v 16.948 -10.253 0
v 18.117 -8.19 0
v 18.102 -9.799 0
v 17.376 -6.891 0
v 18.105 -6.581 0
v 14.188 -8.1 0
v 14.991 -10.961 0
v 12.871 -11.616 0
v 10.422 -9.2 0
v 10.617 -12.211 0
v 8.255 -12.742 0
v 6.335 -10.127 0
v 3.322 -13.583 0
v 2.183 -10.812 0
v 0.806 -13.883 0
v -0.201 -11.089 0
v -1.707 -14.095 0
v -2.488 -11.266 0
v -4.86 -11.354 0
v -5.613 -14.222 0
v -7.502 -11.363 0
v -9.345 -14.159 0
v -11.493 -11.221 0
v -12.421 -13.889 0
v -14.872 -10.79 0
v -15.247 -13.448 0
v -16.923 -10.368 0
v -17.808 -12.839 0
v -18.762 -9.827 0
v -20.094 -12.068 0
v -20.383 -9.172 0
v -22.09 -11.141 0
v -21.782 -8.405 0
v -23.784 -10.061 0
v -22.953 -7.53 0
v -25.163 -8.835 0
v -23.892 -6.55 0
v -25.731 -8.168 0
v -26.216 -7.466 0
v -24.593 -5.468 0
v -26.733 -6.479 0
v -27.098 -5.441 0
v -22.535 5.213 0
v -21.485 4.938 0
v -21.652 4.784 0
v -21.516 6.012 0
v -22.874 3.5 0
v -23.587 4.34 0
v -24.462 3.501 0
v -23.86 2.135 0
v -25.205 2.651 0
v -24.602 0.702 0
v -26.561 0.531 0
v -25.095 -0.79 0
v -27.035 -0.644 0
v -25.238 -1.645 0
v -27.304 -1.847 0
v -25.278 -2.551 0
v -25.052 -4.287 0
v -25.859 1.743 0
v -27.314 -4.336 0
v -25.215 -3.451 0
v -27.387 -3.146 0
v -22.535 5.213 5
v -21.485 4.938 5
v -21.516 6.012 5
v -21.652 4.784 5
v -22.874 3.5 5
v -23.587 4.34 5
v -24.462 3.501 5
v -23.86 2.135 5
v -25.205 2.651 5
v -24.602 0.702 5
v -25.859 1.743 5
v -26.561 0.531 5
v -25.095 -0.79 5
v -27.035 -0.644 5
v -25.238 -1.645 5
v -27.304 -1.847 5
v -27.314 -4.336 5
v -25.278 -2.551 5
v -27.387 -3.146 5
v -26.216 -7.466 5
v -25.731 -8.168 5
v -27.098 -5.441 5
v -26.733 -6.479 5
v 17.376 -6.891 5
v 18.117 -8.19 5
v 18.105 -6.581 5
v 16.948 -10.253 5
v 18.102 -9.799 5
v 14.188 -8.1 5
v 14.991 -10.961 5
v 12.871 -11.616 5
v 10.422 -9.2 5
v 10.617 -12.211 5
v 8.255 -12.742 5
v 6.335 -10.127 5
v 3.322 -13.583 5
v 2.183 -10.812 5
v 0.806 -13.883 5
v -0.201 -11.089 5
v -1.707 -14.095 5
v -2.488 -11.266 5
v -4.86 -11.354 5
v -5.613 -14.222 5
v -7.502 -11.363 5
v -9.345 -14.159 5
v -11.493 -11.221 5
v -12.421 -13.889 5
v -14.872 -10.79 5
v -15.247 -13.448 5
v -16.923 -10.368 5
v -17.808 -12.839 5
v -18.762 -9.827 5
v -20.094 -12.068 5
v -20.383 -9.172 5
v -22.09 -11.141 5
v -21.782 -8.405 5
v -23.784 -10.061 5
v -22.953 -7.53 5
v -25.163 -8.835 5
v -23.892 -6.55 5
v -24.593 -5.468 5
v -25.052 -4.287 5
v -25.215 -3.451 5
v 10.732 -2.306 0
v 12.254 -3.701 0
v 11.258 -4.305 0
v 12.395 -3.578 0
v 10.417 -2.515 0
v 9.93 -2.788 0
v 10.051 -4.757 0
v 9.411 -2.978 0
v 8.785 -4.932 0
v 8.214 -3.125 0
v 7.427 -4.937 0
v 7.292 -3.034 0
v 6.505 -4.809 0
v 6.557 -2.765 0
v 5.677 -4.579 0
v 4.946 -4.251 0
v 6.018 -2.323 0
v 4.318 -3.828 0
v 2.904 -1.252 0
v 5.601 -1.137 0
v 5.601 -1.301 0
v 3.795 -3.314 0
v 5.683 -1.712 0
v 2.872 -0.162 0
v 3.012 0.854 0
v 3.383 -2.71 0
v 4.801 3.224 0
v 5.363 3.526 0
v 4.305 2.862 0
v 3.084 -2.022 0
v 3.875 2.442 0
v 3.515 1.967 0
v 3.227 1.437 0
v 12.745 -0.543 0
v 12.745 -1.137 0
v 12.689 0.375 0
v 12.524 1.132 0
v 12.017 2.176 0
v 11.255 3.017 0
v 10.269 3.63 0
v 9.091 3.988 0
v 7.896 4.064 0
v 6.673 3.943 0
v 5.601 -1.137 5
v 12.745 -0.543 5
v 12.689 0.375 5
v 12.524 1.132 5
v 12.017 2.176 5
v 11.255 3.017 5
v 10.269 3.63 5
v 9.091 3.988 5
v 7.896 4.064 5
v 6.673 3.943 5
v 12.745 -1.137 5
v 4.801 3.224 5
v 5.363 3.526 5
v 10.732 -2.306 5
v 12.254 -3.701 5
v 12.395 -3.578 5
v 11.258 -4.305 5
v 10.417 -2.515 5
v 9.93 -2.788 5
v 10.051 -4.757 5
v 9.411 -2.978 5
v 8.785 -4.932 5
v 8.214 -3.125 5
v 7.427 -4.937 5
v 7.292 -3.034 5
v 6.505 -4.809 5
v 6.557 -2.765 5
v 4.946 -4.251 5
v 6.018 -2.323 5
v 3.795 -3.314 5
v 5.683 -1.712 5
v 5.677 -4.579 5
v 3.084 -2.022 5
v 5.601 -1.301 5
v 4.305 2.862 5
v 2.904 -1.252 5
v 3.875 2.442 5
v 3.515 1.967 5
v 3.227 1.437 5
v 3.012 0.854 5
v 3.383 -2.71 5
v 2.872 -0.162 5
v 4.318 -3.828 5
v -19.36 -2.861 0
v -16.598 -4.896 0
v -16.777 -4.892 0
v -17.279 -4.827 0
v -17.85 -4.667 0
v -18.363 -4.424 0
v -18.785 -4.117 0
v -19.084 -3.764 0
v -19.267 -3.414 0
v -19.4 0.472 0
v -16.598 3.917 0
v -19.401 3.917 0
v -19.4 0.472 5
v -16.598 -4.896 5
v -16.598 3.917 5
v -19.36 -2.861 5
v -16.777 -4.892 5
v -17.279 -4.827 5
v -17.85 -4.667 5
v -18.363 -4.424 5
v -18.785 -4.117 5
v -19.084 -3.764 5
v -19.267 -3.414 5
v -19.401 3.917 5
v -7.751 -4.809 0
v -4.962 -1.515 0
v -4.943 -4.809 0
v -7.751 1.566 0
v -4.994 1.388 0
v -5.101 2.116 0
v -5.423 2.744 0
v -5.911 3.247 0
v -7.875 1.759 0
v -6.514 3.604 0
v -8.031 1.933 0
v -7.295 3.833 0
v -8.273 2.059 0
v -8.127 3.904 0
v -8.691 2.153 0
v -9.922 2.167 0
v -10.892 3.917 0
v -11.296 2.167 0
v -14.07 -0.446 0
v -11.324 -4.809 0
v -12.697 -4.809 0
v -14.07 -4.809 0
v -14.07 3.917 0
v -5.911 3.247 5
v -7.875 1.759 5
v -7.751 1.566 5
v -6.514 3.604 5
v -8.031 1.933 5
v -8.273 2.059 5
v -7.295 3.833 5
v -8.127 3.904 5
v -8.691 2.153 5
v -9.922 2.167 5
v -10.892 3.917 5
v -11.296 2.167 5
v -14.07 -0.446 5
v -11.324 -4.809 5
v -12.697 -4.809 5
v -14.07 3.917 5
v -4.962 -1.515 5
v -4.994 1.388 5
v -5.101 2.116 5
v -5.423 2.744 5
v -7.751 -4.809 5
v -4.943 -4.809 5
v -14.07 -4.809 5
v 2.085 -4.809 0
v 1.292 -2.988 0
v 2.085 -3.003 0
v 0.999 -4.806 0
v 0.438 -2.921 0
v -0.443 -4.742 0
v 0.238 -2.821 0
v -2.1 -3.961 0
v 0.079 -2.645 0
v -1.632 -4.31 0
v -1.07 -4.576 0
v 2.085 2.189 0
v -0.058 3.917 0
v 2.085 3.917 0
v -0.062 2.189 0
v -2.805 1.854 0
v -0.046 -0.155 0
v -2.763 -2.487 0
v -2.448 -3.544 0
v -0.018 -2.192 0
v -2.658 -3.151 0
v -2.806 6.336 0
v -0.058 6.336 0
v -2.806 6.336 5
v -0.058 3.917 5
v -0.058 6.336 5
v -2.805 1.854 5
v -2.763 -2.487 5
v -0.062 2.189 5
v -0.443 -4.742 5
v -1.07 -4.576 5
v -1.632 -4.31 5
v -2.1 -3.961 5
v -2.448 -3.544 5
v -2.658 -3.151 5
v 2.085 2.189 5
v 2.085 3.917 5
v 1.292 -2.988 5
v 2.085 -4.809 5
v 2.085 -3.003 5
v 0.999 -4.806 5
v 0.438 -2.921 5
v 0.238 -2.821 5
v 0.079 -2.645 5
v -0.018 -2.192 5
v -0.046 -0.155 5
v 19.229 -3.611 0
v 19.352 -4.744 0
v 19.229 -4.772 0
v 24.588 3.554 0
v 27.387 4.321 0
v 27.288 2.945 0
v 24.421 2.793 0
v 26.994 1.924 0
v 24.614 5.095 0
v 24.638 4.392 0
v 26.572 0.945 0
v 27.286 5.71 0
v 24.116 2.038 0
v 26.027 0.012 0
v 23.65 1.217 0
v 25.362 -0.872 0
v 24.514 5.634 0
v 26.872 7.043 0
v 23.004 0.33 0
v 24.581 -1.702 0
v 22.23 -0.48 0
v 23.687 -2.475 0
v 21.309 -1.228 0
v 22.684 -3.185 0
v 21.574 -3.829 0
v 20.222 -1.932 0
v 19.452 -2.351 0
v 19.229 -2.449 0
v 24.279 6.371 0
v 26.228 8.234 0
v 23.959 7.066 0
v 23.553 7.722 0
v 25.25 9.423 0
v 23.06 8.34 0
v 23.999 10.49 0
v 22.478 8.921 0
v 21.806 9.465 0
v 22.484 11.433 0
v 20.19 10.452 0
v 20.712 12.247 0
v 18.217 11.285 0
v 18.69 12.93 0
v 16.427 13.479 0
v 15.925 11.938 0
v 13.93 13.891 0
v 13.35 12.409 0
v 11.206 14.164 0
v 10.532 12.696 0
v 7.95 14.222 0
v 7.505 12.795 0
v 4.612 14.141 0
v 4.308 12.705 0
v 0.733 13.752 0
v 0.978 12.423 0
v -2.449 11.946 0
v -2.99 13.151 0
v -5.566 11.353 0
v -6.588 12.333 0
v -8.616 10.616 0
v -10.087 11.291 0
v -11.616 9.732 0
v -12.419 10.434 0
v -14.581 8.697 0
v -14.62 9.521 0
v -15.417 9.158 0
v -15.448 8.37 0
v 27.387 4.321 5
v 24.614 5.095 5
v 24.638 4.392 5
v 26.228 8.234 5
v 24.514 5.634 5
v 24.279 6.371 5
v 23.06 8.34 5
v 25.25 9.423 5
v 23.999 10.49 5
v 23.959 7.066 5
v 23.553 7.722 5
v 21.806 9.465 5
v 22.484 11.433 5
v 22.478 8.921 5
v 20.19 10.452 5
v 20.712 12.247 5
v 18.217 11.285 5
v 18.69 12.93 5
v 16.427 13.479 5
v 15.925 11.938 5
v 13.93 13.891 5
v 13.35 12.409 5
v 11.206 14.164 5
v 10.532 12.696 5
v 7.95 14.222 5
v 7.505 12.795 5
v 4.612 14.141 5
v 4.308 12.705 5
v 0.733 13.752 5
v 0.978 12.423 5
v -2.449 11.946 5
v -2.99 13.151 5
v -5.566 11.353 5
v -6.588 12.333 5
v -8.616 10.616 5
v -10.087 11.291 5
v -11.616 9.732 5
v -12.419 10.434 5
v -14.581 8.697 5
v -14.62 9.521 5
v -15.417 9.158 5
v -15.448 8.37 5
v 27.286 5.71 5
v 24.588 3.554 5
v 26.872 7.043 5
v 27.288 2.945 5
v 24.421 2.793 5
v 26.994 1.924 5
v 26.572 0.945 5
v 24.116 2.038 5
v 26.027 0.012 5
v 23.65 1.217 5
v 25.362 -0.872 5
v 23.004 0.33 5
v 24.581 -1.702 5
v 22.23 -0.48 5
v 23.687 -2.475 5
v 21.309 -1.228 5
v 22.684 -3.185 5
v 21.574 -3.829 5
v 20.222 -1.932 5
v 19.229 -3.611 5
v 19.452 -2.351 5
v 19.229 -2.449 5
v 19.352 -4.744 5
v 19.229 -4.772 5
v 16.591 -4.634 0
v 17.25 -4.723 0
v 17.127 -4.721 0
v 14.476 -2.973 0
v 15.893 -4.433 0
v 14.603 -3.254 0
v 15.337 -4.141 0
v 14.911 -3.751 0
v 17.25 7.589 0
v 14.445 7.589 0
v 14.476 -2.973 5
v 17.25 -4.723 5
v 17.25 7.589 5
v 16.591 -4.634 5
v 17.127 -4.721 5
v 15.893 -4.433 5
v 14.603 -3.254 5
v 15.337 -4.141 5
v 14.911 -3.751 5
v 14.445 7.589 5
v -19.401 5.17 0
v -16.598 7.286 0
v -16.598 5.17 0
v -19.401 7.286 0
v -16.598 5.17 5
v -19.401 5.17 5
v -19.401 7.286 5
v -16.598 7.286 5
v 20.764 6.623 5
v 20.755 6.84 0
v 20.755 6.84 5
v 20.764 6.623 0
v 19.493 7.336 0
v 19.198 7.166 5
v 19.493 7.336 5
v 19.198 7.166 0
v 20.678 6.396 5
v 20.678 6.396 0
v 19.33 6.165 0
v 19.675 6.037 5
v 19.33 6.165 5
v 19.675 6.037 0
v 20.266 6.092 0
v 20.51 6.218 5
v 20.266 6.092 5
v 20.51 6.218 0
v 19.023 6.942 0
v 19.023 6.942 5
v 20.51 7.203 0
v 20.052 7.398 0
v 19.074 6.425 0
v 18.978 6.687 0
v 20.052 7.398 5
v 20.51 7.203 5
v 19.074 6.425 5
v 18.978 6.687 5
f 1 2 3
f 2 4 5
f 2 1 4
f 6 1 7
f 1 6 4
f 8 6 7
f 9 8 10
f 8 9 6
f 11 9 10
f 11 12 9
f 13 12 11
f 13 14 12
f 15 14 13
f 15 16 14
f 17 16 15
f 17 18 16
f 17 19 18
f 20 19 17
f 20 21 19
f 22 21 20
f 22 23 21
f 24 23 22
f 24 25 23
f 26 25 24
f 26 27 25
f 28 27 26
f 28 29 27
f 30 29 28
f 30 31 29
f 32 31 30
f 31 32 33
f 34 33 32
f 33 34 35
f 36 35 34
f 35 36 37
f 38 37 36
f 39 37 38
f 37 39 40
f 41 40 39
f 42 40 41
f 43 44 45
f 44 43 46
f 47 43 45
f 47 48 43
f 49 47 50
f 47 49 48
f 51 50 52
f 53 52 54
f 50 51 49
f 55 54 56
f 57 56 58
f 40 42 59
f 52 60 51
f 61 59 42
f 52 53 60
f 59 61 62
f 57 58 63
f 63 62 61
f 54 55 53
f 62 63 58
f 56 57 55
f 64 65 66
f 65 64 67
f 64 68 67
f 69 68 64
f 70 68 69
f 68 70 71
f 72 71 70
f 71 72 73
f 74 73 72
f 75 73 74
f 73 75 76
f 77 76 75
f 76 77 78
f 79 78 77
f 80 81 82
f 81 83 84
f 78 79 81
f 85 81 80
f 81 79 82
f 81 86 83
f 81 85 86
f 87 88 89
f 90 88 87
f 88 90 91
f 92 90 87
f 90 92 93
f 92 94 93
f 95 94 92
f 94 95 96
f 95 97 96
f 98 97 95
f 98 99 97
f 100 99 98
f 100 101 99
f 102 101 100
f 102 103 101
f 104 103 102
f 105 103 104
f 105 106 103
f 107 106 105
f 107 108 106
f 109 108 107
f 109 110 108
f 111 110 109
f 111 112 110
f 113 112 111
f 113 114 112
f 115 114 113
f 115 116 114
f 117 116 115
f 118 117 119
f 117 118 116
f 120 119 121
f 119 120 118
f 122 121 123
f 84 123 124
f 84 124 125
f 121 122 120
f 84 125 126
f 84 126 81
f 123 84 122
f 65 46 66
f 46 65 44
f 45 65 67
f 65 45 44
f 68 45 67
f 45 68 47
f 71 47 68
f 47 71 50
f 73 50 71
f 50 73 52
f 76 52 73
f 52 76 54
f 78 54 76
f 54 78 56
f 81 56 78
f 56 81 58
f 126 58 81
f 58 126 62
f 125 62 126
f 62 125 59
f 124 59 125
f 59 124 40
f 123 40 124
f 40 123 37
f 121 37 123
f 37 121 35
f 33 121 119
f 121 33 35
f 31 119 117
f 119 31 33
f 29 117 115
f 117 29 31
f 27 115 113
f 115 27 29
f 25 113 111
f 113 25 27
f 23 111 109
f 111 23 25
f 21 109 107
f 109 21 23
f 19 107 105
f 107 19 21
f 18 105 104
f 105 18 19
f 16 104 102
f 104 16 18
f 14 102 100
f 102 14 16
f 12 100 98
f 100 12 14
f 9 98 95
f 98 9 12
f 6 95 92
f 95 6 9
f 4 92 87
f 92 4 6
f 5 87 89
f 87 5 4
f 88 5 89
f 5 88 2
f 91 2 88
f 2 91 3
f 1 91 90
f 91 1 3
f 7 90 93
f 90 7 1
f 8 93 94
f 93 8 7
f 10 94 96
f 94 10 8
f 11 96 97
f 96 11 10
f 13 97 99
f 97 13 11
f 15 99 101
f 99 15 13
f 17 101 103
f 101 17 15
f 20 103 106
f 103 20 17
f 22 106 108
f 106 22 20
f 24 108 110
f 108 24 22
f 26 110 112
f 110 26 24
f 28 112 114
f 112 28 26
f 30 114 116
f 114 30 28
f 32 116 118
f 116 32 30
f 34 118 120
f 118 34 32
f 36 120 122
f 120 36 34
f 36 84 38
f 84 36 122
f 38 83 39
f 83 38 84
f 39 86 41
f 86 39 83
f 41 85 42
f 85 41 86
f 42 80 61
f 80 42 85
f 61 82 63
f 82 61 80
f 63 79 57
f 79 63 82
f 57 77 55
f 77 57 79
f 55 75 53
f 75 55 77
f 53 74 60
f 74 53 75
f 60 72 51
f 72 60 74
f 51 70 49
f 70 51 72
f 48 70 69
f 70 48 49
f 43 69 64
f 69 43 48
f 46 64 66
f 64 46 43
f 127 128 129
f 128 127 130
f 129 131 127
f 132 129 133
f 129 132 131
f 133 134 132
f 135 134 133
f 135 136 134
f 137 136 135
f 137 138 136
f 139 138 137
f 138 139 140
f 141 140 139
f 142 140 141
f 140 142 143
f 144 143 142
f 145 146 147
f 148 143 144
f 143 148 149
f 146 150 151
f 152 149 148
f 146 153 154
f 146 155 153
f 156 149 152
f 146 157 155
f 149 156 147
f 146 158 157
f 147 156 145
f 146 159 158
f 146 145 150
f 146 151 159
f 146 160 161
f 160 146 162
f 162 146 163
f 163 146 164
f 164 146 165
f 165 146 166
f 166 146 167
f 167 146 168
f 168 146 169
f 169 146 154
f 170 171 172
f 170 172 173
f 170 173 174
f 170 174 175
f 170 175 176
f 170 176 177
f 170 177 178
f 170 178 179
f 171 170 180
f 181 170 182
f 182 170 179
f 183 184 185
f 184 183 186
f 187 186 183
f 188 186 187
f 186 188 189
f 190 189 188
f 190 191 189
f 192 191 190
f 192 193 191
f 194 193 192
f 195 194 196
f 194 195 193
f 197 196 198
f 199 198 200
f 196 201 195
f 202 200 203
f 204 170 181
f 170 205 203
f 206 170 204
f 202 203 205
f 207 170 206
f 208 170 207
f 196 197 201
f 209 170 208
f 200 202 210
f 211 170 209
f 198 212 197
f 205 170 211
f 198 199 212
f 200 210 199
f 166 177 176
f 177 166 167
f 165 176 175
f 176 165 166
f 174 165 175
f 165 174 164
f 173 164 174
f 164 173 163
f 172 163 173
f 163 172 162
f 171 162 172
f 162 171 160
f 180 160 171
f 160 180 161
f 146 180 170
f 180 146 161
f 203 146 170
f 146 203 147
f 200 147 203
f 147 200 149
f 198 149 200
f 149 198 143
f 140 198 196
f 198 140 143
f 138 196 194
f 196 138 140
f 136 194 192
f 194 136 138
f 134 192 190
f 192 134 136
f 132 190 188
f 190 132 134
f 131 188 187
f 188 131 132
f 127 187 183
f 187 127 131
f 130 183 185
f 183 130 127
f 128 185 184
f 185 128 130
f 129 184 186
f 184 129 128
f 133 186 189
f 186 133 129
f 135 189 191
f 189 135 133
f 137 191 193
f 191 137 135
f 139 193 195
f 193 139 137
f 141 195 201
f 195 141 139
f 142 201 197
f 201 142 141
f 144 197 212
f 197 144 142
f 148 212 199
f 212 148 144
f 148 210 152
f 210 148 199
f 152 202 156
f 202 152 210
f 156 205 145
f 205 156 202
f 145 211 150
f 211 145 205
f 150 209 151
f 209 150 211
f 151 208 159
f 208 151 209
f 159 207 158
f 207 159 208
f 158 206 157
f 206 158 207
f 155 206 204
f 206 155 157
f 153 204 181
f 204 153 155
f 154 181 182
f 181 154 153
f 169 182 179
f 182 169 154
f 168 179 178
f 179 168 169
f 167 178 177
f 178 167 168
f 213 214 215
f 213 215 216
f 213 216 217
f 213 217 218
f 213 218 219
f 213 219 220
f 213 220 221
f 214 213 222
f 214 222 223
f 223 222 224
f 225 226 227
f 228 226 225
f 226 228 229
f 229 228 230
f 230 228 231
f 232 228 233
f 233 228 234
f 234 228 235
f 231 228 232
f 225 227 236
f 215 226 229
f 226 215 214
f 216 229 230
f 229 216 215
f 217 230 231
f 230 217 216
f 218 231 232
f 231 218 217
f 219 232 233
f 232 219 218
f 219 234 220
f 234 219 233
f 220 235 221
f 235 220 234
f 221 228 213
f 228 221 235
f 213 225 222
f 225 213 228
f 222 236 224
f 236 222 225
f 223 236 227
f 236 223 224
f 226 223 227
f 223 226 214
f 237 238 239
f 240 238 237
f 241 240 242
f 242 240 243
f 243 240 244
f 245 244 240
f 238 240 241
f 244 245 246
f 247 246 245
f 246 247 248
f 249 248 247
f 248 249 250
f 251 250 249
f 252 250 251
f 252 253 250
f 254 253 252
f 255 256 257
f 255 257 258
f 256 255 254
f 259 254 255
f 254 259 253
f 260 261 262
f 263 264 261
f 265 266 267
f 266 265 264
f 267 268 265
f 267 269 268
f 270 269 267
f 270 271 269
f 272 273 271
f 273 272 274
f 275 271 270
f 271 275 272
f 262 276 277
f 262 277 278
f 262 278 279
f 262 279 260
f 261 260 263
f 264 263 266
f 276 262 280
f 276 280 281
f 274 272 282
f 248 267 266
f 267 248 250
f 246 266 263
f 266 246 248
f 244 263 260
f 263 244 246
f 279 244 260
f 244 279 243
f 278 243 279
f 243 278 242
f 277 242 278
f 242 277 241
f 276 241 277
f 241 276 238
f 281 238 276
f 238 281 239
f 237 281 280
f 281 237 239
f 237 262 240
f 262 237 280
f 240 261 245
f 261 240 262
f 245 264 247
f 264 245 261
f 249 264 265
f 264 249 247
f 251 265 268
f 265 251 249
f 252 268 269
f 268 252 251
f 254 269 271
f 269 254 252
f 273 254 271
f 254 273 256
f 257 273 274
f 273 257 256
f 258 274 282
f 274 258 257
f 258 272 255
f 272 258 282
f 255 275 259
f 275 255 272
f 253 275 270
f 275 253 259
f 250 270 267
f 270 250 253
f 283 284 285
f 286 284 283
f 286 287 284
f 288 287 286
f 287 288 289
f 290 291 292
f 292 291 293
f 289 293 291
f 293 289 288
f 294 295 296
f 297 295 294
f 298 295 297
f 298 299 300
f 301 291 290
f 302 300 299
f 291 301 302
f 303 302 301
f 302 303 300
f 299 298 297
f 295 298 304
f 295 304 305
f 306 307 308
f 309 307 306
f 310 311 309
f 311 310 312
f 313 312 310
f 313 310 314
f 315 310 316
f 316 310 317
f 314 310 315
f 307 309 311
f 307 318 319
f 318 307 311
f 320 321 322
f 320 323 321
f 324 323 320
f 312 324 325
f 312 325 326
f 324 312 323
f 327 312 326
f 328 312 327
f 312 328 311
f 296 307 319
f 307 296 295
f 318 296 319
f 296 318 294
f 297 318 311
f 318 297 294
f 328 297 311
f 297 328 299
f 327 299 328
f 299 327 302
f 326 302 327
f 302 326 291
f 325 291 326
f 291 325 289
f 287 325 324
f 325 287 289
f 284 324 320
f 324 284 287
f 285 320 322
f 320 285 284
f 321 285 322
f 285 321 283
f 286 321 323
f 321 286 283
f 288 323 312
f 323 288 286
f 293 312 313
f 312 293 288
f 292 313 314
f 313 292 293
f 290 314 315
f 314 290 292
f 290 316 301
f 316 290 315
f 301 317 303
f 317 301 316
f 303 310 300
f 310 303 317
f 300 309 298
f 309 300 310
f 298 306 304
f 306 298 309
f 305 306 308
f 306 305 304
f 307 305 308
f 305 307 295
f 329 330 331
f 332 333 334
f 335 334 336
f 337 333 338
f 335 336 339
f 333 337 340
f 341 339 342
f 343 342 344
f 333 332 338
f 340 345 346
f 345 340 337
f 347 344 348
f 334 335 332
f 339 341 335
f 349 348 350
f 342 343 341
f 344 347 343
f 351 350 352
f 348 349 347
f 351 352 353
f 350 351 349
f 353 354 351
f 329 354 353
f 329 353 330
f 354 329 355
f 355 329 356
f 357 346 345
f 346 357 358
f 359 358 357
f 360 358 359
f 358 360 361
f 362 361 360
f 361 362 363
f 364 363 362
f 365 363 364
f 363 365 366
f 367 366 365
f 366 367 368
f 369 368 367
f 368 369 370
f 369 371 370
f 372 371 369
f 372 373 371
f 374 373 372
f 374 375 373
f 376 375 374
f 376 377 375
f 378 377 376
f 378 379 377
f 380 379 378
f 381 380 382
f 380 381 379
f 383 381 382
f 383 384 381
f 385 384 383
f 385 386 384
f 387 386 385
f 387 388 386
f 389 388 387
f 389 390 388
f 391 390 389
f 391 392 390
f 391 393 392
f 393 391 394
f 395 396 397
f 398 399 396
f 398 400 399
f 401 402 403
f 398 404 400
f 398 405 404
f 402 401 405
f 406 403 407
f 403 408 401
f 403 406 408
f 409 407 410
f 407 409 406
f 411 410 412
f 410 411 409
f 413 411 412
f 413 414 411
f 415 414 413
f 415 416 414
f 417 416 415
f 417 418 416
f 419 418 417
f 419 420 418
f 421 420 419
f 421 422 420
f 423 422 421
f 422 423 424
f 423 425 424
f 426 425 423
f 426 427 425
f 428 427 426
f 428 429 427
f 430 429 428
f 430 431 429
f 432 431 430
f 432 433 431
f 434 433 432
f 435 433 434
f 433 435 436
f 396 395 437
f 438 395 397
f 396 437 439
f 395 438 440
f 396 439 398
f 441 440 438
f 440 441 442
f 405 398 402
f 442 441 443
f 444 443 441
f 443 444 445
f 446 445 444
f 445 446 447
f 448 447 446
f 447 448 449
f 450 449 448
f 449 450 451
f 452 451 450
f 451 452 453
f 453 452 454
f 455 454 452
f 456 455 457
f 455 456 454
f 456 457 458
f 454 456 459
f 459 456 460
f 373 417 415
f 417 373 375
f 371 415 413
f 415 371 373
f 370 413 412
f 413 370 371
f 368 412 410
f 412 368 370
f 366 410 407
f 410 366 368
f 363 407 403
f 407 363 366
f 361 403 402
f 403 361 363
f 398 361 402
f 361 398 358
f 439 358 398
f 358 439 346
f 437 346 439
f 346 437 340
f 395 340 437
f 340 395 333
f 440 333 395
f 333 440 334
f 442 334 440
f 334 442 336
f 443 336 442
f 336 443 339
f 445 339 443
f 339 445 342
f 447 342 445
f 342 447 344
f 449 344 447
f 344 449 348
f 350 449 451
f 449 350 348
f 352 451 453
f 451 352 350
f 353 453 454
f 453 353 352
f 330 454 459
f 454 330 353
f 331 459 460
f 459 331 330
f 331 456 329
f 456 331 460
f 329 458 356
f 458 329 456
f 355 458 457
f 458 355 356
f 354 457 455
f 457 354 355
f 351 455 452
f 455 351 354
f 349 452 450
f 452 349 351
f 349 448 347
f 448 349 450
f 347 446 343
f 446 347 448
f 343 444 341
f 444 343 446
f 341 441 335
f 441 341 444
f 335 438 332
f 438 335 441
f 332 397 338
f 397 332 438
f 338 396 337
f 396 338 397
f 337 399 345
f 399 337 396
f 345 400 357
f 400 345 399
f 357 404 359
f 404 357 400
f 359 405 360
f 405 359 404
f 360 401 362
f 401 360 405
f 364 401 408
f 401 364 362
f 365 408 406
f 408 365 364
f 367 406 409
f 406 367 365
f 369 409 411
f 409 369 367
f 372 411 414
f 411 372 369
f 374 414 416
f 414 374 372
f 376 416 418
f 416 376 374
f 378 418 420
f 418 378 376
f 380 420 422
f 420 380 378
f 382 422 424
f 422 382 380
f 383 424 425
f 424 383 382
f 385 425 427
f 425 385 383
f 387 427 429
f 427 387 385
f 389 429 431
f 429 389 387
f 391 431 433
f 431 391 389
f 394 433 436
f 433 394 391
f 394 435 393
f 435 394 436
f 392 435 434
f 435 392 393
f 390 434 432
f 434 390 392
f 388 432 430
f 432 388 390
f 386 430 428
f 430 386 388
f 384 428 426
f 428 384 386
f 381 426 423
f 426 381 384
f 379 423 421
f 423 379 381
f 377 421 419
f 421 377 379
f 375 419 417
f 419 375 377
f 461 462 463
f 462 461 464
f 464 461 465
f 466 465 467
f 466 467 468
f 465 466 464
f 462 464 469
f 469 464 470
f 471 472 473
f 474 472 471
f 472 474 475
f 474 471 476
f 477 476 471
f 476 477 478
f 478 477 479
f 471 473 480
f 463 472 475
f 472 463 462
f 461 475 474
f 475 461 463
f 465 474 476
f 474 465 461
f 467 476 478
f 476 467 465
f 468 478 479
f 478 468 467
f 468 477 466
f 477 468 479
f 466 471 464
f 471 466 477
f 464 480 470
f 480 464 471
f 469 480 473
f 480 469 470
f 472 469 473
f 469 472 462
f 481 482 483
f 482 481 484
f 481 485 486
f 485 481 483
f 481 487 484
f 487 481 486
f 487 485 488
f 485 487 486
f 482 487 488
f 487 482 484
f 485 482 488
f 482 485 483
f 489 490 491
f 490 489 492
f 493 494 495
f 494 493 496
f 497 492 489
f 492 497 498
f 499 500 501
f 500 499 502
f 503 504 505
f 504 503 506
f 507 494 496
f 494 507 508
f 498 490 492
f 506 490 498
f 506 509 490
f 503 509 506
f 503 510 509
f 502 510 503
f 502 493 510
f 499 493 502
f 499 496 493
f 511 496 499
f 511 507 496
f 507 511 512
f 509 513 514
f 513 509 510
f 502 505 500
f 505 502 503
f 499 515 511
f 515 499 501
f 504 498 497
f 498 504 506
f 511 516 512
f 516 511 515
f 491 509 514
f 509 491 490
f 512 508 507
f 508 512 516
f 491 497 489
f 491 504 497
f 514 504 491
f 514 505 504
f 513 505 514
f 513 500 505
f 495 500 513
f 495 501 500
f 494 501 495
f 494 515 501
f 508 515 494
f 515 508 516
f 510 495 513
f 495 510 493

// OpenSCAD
module path_path3352(h)
{
  scale([25.4/90, -25.4/90, 1])
    linear_extrude(height=h)
      polygon(points=[[-33.111633,50.168154],[-44.012584,49.213578],[-54.023851,47.649181],[-63.100482,45.492795],[-71.197524,42.762250],[-78.270026,39.475378],[-84.273035,35.650010],[-89.161598,31.303979],[-91.173915,28.941286],[-92.890763,26.455114],[-94.723907,22.957046],[-96.015966,19.279001],[-96.782855,15.362265],[-97.040493,11.148124],[-96.745693,6.545797],[-95.794033,2.280564],[-94.112301,-1.881905],[-91.627283,-6.175936],[-89.309517,-9.392914],[-86.677459,-12.406425],[-83.575963,-15.378429],[-79.849883,-18.470886],[-76.237963,-21.302676],[-76.183063,-19.400586],[-76.128163,-17.498496],[-76.718383,-16.951476],[-81.050087,-12.400645],[-84.543446,-7.565842],[-87.174068,-2.486557],[-88.917563,2.797724],[-89.424240,5.827239],[-89.566139,9.039295],[-89.345776,12.228741],[-88.765663,15.190424],[-87.140493,19.374438],[-84.655876,23.208724],[-81.329610,26.681912],[-77.179492,29.782633],[-72.223318,32.499515],[-66.478886,34.821191],[-59.963992,36.736291],[-52.696433,38.233444],[-40.723683,39.760806],[-26.581603,40.262034],[-17.221748,40.230718],[-8.814548,39.919613],[-0.711781,39.291855],[7.734777,38.310584],[22.445442,35.881930],[36.928359,32.599864],[50.273066,28.699385],[61.569097,24.415494],[64.151257,23.317184],[64.192557,29.019034],[64.141557,34.720884],[60.052227,36.328114],[53.116932,38.839293],[45.606097,41.159691],[37.617882,43.269090],[29.250449,45.147270],[11.770571,48.129101],[2.854447,49.192314],[-6.048253,49.943434],[-19.889896,50.391321],[-33.111723,50.168154],[-33.111633,50.168154]]);
  scale([25.4/90, -25.4/90, 1])
    linear_extrude(height=h)
      polygon(points=[[26.315127,17.493594],[23.048386,17.040187],[20.113770,16.226454],[17.525721,15.064159],[15.298676,13.565068],[13.447074,11.740944],[11.985356,9.603554],[10.927961,7.164662],[10.289327,4.436034],[10.177769,0.572899],[10.672737,-3.027166],[11.433263,-5.090272],[12.455310,-6.967962],[13.731097,-8.653671],[15.252842,-10.140832],[17.012764,-11.422881],[19.003083,-12.493250],[23.643787,-13.972686],[27.978032,-14.399835],[32.210637,-14.130826],[36.387895,-12.861282],[39.880651,-10.691090],[42.580182,-7.710686],[44.377767,-4.010506],[44.962352,-1.328646],[45.157717,1.925674],[45.158267,4.030384],[32.502687,4.030384],[19.847107,4.030384],[19.847107,4.610504],[20.137537,6.067234],[21.323694,8.231358],[23.233823,9.798030],[25.837719,10.750394],[29.105177,11.071594],[33.345884,10.552341],[35.184033,9.879966],[36.908907,8.911704],[38.025697,8.169334],[40.972197,10.424074],[43.918707,12.678824],[43.418957,13.114034],[39.891932,15.253343],[35.613677,16.854714],[31.127066,17.475343],[26.315127,17.493594],[26.315127,17.493594]]);
  scale([25.4/90, -25.4/90, 1])
    linear_extrude(height=h)
      polygon(points=[[35.419827,-1.671476],[35.134487,-3.062076],[34.103136,-5.324575],[32.432978,-6.924985],[30.171019,-7.833315],[27.364267,-8.019576],[24.495146,-7.484176],[22.247761,-6.297770],[20.697454,-4.519177],[19.919567,-2.207216],[19.793497,-1.327066],[27.608347,-1.327066],[35.423207,-1.327066],[35.420207,-1.671476],[35.419827,-1.671476]]);
  scale([25.4/90, -25.4/90, 1])
    linear_extrude(height=h)
      polygon(points=[[-61.226273,17.103474],[-63.249525,16.536841],[-65.064811,15.676173],[-66.559580,14.587742],[-67.621283,13.337824],[-68.269088,12.095166],[-68.599977,10.137416],[-68.739083,-1.671476],[-68.742083,-13.878796],[-63.777203,-13.878796],[-58.812313,-13.878796],[-58.812313,1.734334],[-58.812313,17.347454],[-59.445093,17.334654],[-61.226393,17.103424],[-61.226273,17.103474]]);
  scale([25.4/90, -25.4/90, 1])
    linear_extrude(height=h)
      polygon(points=[[-49.855943,1.581264],[-49.855943,-13.878796],[-38.594413,-13.878796],[-28.795311,-13.834210],[-25.849873,-13.580606],[-23.081018,-12.770774],[-20.944053,-11.506186],[-19.217029,-9.722319],[-18.074503,-7.497916],[-17.696721,-4.916469],[-17.581453,5.369744],[-17.513353,17.041314],[-22.489313,17.041314],[-27.465263,17.041314],[-27.465263,5.746584],[-27.465263,-5.548156],[-27.903343,-6.231136],[-28.455364,-6.850099],[-29.314923,-7.296276],[-30.795473,-7.628739],[-35.155963,-7.678946],[-40.023493,-7.679406],[-40.073293,4.680984],[-40.123093,17.041374],[-44.989473,17.041374],[-49.855853,17.041314],[-49.855853,1.581264],[-49.855943,1.581264]]);
  scale([25.4/90, -25.4/90, 1])
    linear_extrude(height=h)
      polygon(points=[[-1.570033,16.802514],[-3.792363,16.215176],[-5.781114,15.273391],[-7.440152,14.034626],[-8.673343,12.556344],[-9.417675,11.166746],[-9.791008,8.810964],[-9.938803,-6.569706],[-9.941803,-22.450706],[-5.074273,-22.450706],[-0.206743,-22.450706],[-0.206743,-18.164746],[-0.206743,-13.878796],[3.589937,-13.878796],[7.386607,-13.878796],[7.386607,-10.817396],[7.386607,-7.755996],[3.583537,-7.755996],[-0.219533,-7.755996],[-0.164433,0.548044],[-0.062786,7.767596],[0.280047,9.371824],[0.843445,9.996299],[1.551018,10.351615],[4.577327,10.588464],[7.386637,10.641064],[7.386637,13.841184],[7.386637,17.041294],[3.541287,17.029094],[-1.569623,16.802464],[-1.570033,16.802514]]);
  scale([25.4/90, -25.4/90, 1])
    linear_extrude(height=h)
      polygon(points=[[68.133017,12.793864],[68.133017,8.678844],[68.923457,8.329584],[71.653097,6.845714],[75.503597,4.350627],[78.767572,1.699689],[81.510935,-1.167647],[83.799597,-4.311926],[85.449490,-7.219843],[86.530429,-9.895444],[87.121210,-12.591943],[87.300627,-15.562556],[87.214373,-18.053447],[86.861697,-19.964146],[86.028793,-22.573688],[84.894706,-25.038389],[83.455417,-27.362725],[81.706907,-29.551174],[79.645157,-31.608212],[77.266150,-33.538317],[71.540287,-37.035636],[64.547890,-39.986794],[56.425591,-42.301167],[47.304811,-43.970083],[37.316969,-44.984870],[26.593485,-45.336855],[15.265779,-45.017366],[3.465269,-44.017731],[-8.676623,-42.329276],[-19.723210,-40.225564],[-30.530351,-37.616041],[-41.157502,-34.484781],[-51.664123,-30.815856],[-54.737863,-29.657846],[-54.681963,-31.053626],[-54.626063,-32.449406],[-51.802893,-33.736256],[-44.003664,-36.970042],[-35.740043,-40.006496],[-23.341635,-43.698156],[-10.595557,-46.598901],[2.598926,-48.728264],[16.342547,-50.105776],[28.170141,-50.391321],[39.706697,-50.185676],[49.357044,-49.221606],[58.205413,-47.761210],[66.224643,-45.815212],[73.387573,-43.394330],[79.667043,-40.509286],[85.035893,-37.170800],[89.466961,-33.389593],[92.933087,-29.176386],[95.216826,-24.955994],[96.684197,-20.231166],[97.040493,-15.310161],[96.691197,-10.434696],[95.646426,-6.818839],[94.152342,-3.349578],[92.221300,-0.041560],[89.865653,3.090571],[87.097756,6.032170],[83.929963,8.768590],[80.374629,11.285186],[76.444107,13.567314],[68.570667,16.809624],[68.132587,16.908924],[68.132587,12.793914],[68.133017,12.793864]]);
  scale([25.4/90, -25.4/90, 1])
    linear_extrude(height=h)
      polygon(points=[[58.787357,16.418754],[56.312959,15.706109],[54.342107,14.673156],[52.833187,13.291015],[51.744587,11.530804],[51.291357,10.535844],[51.237457,-8.176936],[51.183557,-26.889726],[56.153637,-26.889726],[61.123717,-26.889726],[61.123717,-5.077276],[61.123717,16.735174],[60.685637,16.727174],[58.787297,16.419174],[58.787357,16.418754]]);
  scale([25.4/90, -25.4/90, 1])
    linear_extrude(height=h)
      polygon(points=[[-68.741963,-22.068026],[-68.741963,-25.818236],[-63.777083,-25.818236],[-58.812193,-25.818236],[-58.812193,-22.068026],[-58.812193,-18.317816],[-63.777083,-18.317816],[-68.741963,-18.317816],[-68.741963,-22.068026],[-68.741963,-22.068026]]);
  scale([25.4/90, -25.4/90, 1])
    linear_extrude(height=h)
      polygon(points=[[69.714537,-21.392306],[68.493259,-21.843777],[67.585437,-22.765806],[67.244490,-23.693613],[67.404213,-24.596549],[68.025983,-25.390738],[69.071177,-25.992306],[71.051069,-26.212638],[72.671721,-25.523890],[73.541456,-24.236813],[73.572330,-23.466010],[73.268597,-22.662156],[72.671920,-22.033726],[71.807354,-21.586407],[69.714537,-21.392306],[69.714537,-21.392306]]);
  scale([25.4/90, -25.4/90, 1])
    linear_extrude(height=h)
      polygon(points=[[71.980147,-21.837596],[73.190358,-22.916962],[73.337182,-24.216349],[72.517976,-25.379231],[70.830097,-26.049086],[69.217097,-25.843312],[67.944237,-25.025036],[67.539188,-23.722825],[67.969737,-22.530616],[68.839569,-21.916097],[69.874766,-21.582475],[70.960053,-21.549668],[71.980157,-21.837596],[71.980147,-21.837596]]);
  scale([25.4/90, -25.4/90, 1])
    linear_extrude(height=h)
      polygon(points=[[69.301227,-23.828336],[69.490001,-25.134895],[70.841417,-25.109206],[71.462983,-24.870436],[71.760827,-24.479300],[71.698903,-24.059670],[71.241167,-23.735416],[70.971229,-23.540401],[71.349817,-23.024716],[71.591587,-22.450706],[70.969797,-22.986446],[70.146717,-23.522196],[69.771882,-23.426765],[69.690627,-22.986446],[69.495927,-22.450706],[69.301227,-23.828336],[69.301227,-23.828336]]);
  scale([25.4/90, -25.4/90, 1])
    linear_extrude(height=h)
      polygon(points=[[71.261787,-24.070766],[71.292306,-24.587144],[70.401037,-24.870796],[69.784944,-24.839624],[69.690627,-24.373316],[69.785467,-23.906940],[70.348247,-23.828336],[71.261787,-24.070766],[71.261787,-24.070766]]);
}

path_path3352(5);
